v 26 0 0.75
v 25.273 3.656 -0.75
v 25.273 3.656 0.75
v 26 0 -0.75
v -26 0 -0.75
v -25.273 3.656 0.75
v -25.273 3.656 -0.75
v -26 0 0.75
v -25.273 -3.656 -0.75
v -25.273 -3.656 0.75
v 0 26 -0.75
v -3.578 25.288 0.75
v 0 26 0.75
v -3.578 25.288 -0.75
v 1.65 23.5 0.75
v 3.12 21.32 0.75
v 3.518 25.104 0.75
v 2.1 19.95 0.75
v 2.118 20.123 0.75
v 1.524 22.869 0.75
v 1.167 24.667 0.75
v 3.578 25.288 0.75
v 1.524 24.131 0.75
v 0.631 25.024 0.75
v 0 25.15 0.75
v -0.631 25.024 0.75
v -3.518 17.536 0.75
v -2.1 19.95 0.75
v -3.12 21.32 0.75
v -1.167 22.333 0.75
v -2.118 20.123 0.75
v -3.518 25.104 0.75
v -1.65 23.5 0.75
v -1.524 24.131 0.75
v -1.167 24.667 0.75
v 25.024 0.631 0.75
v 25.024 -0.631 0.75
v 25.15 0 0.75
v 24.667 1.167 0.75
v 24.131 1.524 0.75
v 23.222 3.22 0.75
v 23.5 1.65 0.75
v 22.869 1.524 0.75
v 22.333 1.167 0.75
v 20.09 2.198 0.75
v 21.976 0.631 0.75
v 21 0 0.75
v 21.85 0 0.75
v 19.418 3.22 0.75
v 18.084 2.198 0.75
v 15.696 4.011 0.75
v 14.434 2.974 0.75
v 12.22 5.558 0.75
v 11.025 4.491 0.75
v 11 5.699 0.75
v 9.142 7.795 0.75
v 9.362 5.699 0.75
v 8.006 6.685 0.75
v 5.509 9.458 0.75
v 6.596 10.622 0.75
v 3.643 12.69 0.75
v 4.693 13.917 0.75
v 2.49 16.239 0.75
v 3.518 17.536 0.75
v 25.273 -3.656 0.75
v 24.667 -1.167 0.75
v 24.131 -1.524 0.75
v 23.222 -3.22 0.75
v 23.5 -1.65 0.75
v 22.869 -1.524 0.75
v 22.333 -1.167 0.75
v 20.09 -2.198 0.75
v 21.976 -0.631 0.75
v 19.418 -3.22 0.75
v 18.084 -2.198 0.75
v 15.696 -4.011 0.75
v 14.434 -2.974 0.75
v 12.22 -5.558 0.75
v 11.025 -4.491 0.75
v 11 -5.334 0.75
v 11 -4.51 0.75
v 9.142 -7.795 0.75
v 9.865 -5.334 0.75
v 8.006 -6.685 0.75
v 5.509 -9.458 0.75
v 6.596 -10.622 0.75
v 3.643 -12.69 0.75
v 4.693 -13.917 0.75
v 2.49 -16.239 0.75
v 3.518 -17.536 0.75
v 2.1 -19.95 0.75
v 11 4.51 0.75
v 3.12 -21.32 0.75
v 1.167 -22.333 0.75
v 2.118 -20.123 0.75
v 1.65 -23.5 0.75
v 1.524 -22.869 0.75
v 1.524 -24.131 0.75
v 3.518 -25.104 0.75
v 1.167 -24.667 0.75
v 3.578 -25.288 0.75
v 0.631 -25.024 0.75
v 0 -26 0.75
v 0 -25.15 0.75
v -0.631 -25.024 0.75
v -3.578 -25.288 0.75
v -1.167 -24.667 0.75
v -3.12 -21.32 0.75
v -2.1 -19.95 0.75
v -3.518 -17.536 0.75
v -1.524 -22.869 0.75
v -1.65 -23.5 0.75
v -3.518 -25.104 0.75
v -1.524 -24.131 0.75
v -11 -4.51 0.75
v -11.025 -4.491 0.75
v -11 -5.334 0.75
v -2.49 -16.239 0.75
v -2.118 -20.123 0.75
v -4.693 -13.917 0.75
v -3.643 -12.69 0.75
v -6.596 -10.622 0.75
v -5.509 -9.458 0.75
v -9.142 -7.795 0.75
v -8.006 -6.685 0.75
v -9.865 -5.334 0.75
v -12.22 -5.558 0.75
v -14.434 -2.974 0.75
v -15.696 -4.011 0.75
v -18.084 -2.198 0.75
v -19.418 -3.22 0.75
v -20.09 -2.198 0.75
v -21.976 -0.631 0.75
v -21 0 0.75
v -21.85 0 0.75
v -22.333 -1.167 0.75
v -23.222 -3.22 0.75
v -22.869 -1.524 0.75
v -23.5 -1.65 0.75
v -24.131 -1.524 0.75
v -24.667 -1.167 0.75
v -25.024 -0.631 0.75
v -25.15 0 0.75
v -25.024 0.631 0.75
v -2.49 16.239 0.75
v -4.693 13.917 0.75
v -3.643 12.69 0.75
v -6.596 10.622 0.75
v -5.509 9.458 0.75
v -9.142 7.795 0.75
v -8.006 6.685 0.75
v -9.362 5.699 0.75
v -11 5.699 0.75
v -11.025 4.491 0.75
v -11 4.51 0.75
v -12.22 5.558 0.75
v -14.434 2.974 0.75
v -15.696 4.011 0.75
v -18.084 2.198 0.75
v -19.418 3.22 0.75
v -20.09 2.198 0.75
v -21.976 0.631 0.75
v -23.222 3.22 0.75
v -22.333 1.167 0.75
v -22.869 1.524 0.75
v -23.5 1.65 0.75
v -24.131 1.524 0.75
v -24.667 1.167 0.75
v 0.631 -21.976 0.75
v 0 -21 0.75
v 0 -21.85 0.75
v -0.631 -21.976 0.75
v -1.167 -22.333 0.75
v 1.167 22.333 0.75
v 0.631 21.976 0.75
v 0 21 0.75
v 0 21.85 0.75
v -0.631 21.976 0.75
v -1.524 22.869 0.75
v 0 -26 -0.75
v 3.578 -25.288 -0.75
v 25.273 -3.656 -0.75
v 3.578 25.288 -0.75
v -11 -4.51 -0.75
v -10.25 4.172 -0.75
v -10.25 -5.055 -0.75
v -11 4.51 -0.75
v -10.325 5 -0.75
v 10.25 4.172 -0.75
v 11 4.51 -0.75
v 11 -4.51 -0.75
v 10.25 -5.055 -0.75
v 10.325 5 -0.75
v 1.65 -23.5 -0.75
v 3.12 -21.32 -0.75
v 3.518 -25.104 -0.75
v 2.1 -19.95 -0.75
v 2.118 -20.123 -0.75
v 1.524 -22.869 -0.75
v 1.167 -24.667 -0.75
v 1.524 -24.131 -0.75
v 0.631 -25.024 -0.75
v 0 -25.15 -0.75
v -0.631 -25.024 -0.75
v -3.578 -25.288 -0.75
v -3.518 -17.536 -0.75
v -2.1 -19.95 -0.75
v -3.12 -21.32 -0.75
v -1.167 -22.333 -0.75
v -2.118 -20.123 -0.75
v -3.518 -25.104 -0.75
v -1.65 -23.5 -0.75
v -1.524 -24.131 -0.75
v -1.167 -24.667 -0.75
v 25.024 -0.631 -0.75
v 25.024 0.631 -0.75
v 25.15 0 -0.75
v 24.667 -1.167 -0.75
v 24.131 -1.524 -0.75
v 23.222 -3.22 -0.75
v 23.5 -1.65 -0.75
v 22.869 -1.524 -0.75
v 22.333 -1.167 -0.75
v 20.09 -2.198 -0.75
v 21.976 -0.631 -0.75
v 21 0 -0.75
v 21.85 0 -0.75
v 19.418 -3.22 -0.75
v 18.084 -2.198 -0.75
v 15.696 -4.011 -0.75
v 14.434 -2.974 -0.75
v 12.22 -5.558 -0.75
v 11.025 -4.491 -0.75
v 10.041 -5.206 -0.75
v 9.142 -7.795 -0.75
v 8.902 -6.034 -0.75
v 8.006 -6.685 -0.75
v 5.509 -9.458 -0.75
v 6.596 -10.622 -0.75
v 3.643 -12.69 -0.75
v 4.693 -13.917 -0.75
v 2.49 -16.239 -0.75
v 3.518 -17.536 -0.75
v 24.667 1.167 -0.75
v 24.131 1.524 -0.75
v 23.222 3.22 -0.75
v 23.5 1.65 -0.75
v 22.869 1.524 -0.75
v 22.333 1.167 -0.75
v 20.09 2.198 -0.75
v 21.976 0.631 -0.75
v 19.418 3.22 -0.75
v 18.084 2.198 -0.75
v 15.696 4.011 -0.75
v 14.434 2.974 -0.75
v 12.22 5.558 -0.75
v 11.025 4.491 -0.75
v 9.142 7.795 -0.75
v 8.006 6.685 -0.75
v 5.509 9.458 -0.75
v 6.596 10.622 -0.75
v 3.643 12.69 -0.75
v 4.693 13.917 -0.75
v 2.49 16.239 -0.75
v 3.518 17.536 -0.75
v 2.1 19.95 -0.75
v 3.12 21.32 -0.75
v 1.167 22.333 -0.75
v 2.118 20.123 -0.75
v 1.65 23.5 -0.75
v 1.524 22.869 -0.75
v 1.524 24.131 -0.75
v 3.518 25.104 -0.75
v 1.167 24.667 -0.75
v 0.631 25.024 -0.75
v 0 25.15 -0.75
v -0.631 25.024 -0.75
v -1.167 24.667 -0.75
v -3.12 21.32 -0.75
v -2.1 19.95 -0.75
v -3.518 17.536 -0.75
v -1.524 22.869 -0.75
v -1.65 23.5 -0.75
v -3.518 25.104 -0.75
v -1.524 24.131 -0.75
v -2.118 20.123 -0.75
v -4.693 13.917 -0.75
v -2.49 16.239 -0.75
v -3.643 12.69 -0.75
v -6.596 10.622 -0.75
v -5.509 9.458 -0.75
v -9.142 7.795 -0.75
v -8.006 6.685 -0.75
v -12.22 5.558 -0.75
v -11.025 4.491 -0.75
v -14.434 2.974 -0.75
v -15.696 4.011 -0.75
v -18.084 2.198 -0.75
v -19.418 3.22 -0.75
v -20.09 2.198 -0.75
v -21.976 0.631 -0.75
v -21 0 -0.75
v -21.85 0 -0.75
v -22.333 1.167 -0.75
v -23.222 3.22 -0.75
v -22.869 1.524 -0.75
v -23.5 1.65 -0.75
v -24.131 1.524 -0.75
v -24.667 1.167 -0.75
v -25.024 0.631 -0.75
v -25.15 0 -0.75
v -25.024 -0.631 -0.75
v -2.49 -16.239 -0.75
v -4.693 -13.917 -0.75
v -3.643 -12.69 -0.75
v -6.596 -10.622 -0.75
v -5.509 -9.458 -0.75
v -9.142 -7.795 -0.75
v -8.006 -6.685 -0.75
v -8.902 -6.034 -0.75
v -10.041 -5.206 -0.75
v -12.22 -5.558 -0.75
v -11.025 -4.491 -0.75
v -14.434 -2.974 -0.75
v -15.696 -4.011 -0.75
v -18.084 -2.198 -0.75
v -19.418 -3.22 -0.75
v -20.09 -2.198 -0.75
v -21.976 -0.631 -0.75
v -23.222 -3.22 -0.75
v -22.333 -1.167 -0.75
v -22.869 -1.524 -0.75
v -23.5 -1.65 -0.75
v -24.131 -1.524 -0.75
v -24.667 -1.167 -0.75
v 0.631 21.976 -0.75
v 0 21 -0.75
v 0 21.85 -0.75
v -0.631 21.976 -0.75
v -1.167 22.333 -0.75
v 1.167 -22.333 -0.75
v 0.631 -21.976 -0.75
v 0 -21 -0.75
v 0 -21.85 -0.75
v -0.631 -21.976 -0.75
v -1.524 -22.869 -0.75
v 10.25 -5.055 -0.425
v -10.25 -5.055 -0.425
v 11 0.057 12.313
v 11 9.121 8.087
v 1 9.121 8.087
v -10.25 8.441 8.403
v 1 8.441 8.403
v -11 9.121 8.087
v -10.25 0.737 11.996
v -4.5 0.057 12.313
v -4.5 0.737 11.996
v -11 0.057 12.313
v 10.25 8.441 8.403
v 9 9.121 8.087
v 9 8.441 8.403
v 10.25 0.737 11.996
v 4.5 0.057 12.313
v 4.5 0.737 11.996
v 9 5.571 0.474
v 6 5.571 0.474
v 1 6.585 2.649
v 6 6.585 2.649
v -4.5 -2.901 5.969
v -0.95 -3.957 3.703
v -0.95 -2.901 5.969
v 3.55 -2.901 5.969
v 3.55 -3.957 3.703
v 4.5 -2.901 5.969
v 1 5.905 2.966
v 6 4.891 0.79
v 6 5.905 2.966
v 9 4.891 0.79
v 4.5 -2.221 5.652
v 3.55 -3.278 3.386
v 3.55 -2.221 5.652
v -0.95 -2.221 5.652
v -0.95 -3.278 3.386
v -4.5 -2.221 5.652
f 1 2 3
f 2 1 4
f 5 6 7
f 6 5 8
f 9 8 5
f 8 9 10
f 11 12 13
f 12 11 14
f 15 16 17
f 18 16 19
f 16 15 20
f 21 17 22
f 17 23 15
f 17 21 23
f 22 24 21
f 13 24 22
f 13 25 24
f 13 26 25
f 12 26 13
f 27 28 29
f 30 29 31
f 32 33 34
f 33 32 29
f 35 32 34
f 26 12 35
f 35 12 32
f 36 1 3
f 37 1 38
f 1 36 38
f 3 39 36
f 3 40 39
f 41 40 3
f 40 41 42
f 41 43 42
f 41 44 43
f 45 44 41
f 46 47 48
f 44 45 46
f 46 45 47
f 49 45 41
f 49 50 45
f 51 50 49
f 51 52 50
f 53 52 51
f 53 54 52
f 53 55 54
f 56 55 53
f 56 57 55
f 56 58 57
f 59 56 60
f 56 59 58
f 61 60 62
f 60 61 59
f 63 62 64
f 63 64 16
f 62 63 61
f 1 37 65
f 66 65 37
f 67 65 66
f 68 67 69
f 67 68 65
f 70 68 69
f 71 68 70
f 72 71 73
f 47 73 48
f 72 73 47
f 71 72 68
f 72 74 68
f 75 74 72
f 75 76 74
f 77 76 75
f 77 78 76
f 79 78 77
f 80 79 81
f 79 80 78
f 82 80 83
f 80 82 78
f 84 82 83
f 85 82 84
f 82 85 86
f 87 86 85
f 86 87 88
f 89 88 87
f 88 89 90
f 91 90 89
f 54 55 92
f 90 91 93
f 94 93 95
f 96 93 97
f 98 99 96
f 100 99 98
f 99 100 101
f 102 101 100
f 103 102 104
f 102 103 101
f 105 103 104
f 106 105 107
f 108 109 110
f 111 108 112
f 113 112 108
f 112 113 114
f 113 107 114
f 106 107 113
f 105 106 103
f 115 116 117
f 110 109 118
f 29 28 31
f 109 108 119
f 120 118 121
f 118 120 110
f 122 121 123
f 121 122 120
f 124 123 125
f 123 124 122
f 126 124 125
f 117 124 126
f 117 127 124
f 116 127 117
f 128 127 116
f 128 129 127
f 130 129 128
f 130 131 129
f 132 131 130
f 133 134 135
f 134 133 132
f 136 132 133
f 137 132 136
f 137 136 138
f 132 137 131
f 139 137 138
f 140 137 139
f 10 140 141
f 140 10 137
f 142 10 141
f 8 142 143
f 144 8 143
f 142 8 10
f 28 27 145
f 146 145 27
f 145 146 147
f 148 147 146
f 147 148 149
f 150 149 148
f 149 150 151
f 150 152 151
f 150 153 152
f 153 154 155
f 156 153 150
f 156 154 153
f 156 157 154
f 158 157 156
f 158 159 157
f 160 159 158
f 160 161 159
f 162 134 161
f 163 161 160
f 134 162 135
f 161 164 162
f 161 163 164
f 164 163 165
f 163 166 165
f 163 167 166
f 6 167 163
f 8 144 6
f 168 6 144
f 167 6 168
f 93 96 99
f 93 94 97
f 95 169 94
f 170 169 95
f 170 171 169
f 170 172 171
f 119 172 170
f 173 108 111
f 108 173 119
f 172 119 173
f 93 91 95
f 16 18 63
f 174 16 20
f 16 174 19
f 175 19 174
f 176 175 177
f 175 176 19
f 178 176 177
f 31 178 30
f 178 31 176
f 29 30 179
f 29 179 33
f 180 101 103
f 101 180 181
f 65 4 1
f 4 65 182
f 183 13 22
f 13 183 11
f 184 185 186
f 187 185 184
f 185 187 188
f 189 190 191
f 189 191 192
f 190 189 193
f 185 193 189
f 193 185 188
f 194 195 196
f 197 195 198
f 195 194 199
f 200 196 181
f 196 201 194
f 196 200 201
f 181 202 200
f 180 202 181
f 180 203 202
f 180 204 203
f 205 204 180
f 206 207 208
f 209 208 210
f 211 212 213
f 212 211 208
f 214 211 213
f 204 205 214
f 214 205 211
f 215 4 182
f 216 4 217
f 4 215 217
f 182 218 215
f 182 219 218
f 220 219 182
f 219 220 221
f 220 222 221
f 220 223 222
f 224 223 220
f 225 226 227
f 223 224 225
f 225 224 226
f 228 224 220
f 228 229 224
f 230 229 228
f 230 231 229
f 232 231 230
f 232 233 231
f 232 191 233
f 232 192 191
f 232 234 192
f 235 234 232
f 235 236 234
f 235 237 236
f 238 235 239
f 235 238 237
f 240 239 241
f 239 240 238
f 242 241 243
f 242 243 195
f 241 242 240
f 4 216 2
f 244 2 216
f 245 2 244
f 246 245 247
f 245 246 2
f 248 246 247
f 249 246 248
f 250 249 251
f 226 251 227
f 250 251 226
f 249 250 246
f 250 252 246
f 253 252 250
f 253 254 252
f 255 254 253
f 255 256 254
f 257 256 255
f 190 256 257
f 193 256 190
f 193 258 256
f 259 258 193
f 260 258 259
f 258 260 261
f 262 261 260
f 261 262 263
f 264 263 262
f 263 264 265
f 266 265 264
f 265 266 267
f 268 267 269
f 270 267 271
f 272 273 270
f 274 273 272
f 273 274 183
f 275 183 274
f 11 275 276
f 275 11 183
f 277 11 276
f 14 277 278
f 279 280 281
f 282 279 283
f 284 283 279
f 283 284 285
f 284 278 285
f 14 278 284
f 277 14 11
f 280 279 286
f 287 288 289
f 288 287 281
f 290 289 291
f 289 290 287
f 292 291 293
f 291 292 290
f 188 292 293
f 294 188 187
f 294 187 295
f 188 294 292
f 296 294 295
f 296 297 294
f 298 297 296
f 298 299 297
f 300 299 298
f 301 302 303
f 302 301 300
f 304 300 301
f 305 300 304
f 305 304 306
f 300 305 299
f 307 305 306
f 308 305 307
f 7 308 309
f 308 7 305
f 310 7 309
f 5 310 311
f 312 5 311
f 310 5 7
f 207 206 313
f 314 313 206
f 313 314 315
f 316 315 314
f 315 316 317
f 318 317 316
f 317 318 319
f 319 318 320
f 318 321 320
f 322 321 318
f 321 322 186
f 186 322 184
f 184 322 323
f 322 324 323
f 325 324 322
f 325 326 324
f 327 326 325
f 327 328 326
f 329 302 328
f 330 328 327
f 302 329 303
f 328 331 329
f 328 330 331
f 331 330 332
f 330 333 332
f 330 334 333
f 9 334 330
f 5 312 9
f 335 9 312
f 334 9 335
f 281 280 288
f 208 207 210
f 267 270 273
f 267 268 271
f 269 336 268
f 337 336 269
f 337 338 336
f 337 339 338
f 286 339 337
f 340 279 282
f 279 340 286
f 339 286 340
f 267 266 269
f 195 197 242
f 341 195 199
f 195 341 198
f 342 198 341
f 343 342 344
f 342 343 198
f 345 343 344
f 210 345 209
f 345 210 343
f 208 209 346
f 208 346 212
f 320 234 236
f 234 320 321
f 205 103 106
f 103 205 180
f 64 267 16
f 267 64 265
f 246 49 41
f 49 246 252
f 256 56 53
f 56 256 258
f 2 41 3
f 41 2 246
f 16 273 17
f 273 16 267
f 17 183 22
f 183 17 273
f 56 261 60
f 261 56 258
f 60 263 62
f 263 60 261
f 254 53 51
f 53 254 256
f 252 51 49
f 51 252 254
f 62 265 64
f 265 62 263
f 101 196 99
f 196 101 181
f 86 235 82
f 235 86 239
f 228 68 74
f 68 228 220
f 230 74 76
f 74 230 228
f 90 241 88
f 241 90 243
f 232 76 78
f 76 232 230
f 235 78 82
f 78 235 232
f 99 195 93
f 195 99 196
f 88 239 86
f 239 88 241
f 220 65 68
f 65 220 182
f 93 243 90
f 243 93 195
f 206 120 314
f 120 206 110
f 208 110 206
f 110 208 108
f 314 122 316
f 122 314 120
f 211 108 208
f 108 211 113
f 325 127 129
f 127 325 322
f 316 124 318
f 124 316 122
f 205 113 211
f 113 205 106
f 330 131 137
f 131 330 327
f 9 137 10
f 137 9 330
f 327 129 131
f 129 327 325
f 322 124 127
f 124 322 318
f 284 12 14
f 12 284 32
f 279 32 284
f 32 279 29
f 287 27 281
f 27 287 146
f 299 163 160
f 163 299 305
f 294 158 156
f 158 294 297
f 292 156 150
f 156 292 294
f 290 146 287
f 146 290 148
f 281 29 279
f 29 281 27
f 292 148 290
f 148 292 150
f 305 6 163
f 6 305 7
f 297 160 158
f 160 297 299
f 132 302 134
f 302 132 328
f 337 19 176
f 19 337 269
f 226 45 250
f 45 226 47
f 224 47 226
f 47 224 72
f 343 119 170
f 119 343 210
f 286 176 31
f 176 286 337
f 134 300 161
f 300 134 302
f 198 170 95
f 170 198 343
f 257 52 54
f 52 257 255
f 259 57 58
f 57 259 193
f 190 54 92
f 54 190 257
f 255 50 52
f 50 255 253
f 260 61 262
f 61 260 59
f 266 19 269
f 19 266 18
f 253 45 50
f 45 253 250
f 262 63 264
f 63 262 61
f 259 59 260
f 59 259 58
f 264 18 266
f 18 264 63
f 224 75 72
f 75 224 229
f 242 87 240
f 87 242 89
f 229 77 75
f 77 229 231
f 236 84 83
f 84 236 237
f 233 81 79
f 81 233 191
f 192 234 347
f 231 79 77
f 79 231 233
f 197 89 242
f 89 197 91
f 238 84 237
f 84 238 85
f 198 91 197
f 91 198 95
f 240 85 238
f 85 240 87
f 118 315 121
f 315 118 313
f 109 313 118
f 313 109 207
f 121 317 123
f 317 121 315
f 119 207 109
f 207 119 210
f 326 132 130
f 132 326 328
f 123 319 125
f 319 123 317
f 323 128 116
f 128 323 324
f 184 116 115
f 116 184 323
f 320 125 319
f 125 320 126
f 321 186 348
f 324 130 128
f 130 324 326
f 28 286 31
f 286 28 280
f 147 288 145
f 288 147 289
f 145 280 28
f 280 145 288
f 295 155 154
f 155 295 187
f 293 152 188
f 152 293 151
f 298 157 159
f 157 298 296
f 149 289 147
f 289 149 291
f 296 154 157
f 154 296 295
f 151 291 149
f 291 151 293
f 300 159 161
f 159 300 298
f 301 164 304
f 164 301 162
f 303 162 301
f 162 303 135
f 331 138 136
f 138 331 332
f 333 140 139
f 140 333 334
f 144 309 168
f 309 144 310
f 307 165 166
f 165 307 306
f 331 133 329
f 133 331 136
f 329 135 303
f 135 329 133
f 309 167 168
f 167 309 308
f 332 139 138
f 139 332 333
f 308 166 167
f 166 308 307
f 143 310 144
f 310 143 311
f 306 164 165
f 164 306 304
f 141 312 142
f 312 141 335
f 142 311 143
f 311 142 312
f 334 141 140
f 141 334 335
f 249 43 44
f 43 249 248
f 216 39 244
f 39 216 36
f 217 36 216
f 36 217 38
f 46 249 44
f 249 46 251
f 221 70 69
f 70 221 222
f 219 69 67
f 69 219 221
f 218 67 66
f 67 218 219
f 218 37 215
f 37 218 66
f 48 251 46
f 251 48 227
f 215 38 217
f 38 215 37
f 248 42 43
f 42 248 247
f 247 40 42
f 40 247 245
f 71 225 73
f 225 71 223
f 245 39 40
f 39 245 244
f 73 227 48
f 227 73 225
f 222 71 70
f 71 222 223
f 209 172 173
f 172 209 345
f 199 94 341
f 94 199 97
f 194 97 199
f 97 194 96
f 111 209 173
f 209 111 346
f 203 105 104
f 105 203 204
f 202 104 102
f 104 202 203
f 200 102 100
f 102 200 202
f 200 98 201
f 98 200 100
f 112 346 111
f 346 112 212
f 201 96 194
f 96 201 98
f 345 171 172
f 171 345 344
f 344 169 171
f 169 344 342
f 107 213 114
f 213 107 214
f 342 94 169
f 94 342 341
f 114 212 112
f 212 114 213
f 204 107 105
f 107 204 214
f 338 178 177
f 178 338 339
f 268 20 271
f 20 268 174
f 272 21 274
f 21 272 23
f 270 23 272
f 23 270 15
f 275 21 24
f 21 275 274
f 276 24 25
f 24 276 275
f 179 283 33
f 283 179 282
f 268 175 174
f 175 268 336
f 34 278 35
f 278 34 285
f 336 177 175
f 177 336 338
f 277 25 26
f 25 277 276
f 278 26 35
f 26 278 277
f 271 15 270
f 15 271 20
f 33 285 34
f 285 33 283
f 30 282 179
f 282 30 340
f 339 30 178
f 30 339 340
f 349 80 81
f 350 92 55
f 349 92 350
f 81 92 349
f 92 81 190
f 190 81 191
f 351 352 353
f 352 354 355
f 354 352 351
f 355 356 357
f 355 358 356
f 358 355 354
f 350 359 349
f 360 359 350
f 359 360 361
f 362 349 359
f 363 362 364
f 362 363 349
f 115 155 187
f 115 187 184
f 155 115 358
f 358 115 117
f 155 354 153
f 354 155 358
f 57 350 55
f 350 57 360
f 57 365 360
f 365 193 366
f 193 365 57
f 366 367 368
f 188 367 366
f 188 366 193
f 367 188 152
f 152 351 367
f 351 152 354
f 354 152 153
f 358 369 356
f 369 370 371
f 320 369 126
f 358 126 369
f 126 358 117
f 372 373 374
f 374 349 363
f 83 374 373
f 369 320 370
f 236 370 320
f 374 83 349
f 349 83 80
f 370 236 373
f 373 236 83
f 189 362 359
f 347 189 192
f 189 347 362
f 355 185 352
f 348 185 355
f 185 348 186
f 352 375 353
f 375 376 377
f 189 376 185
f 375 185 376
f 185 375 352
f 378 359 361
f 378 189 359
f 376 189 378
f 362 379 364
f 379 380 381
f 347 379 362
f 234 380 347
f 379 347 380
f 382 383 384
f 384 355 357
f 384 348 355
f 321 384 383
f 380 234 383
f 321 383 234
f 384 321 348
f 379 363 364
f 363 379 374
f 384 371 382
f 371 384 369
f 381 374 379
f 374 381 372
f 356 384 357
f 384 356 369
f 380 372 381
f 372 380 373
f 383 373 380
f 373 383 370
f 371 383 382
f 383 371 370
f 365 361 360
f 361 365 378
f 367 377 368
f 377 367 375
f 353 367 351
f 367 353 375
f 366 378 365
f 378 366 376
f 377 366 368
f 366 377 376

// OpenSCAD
// Camera angle
CAMERA_ANGLE = 25;

module tx01_box(angle) {
  inner_width = 19;
  inner_depth = 8;
  height = 8;
  tx_box(19, 8, 8, angle);  
}

module tx03_box(angle) {
  inner_width = 20.5;
  inner_depth = 8.5;
  height = 9.75;
  tx_box(inner_width, inner_depth, height, angle);  
}

module tx_box(inner_width, inner_depth, height, angle) {
    
    wall_thickness = 1.5;
    
    width = inner_width + wall_thickness;
    depth = inner_depth + wall_thickness;
    
    extra_height = (angle + 1)/4;
    
    lens_width=9;
    lens_height=7;
    lens_x_offset = 0;
    lens_z_offset = 0;
    
    lcd_width=8;
    lcd_height=6;
    lcd_x_offset = 5;
    lcd_z_offset = 0;
    
    cap_width=4.5;
    cap_height=2;
    cap_x_offset = 1.3;
    cap_z_offset = 0;
    
    pcord_width=3;
    pcord_height=2.4;
    pcord_x_offset = 7.5;
    pcord_z_offset = 0;
    
    // center
    translate([-width/2, depth/2, -.75])
        difference() {
            // add camera angle
            rotate ([-angle, 0, 0])
                // rotate around rear edge
                translate([0, -depth, 0])
                    difference() {
                        // outer box
                        translate ([0, 0, -extra_height])
                            cube([width, depth, height + extra_height]);
                        // inner box
                        translate ([wall_thickness/2, wall_thickness/2, -extra_height - .5])
                            cube([inner_width, inner_depth, height + extra_height + 1]);
                        
                        // Lens cutout
                        lens_x = (width/2) - (lens_width/2) + lens_x_offset;
                        lens_z = height - lens_height + lens_z_offset;
                        translate ([lens_x, -.5, lens_z])
                            cube([lens_width, wall_thickness+1, lens_height]);
                        // Cap cutout
                        cap_x = (width/2) - (cap_width/2) + cap_x_offset;
                        cap_z = lens_z - cap_height + cap_z_offset;
                        translate ([cap_x, - .5, cap_z - .5])
                            cube([cap_width, wall_thickness + 1, cap_height + .5]);
                        
                        // LCD cutout
                        lcd_x = (width/2) - (lcd_width/2) + lcd_x_offset;
                        lcd_z = height - lcd_height + lcd_z_offset;
                        translate ([lcd_x, depth - wall_thickness + .5, lcd_z])
                            cube([lcd_width, wall_thickness + 1, lcd_height]);
                        // PowerCord cutout
                        pcord_x = (width/2) - (pcord_width/2) + pcord_x_offset;
                        pcord_z = lcd_z - pcord_height + pcord_z_offset;
                        translate ([pcord_x, depth - wall_thickness + .5, pcord_z])
                            cube([pcord_width, wall_thickness + 1, pcord_height]);
                        
                    }
            // cut bottom flat
            translate ([-1, -depth*3, -extra_height])
                cube([ width + 2, depth*3, extra_height]);
        }
}

module 1104_100_plate(hole_spacing, height) {
    
    r1 = (hole_spacing + 5) / 2.0;
    r1cut = 0.7 * r1;
    r1offset = 0.82 * r1;
    
    r2 = (hole_spacing - 5) / 2.0;
    r2cut = 0.85 * r2;
    r2offset = 0.95 * r2;
    
    rnut = 1.65;
    
    difference() {
        // Outer
        difference() {
            cylinder(r=r1, h=height, center=true, $fn=16);        
            translate([r1offset, r1offset, 0])
                cylinder(r=r1cut, h=4, center=true);
            translate([r1offset, -r1offset, 0])
                cylinder(r=r1cut, h=4, center=true);
            translate([-r1offset, -r1offset, 0])
                cylinder(r=r1cut, h=4, center=true);        
            translate([-r1offset, r1offset, 0])
                cylinder(r=r1cut, h=4, center=true);
        }
        
        // Inner
        difference() {
            cylinder(r=r2, h=2*height, center=true, $fn=8);        
            translate([r2offset, r2offset, 0])
                cylinder(r=r2cut, h=2*height, center=true);
            translate([r2offset, -r2offset, 0])
                cylinder(r=r2cut, h=2*height, center=true);
            translate([-r2offset, -r2offset, 0])
                cylinder(r=r2cut, h=2*height, center=true);        
            translate([-r2offset, r2offset, 0])
                cylinder(r=r2cut, h=2*height, center=true);
        }
        
       // M3 Holes
        translate([-hole_spacing / 2.0, 0, 0])        
            cylinder(r=rnut, h=2*height, center=true, $fn=16);
        translate([hole_spacing / 2.0, 0, 0])
            cylinder(r=rnut, h=2*height, center=true, $fn=16);
        translate([0, -hole_spacing / 2.0, 0])
            cylinder(r=rnut, h=2*height, center=true, $fn=16);
        translate([0, hole_spacing / 2.0, 0])
            cylinder(r=rnut, h=2*height, center=true, $fn=16);
    }
}

translate([0, 0, 0]) rotate([0, 0, 0]) 1104_100_plate(47, 1.5);
translate([0, 0, 0]) tx03_box(CAMERA_ANGLE);
